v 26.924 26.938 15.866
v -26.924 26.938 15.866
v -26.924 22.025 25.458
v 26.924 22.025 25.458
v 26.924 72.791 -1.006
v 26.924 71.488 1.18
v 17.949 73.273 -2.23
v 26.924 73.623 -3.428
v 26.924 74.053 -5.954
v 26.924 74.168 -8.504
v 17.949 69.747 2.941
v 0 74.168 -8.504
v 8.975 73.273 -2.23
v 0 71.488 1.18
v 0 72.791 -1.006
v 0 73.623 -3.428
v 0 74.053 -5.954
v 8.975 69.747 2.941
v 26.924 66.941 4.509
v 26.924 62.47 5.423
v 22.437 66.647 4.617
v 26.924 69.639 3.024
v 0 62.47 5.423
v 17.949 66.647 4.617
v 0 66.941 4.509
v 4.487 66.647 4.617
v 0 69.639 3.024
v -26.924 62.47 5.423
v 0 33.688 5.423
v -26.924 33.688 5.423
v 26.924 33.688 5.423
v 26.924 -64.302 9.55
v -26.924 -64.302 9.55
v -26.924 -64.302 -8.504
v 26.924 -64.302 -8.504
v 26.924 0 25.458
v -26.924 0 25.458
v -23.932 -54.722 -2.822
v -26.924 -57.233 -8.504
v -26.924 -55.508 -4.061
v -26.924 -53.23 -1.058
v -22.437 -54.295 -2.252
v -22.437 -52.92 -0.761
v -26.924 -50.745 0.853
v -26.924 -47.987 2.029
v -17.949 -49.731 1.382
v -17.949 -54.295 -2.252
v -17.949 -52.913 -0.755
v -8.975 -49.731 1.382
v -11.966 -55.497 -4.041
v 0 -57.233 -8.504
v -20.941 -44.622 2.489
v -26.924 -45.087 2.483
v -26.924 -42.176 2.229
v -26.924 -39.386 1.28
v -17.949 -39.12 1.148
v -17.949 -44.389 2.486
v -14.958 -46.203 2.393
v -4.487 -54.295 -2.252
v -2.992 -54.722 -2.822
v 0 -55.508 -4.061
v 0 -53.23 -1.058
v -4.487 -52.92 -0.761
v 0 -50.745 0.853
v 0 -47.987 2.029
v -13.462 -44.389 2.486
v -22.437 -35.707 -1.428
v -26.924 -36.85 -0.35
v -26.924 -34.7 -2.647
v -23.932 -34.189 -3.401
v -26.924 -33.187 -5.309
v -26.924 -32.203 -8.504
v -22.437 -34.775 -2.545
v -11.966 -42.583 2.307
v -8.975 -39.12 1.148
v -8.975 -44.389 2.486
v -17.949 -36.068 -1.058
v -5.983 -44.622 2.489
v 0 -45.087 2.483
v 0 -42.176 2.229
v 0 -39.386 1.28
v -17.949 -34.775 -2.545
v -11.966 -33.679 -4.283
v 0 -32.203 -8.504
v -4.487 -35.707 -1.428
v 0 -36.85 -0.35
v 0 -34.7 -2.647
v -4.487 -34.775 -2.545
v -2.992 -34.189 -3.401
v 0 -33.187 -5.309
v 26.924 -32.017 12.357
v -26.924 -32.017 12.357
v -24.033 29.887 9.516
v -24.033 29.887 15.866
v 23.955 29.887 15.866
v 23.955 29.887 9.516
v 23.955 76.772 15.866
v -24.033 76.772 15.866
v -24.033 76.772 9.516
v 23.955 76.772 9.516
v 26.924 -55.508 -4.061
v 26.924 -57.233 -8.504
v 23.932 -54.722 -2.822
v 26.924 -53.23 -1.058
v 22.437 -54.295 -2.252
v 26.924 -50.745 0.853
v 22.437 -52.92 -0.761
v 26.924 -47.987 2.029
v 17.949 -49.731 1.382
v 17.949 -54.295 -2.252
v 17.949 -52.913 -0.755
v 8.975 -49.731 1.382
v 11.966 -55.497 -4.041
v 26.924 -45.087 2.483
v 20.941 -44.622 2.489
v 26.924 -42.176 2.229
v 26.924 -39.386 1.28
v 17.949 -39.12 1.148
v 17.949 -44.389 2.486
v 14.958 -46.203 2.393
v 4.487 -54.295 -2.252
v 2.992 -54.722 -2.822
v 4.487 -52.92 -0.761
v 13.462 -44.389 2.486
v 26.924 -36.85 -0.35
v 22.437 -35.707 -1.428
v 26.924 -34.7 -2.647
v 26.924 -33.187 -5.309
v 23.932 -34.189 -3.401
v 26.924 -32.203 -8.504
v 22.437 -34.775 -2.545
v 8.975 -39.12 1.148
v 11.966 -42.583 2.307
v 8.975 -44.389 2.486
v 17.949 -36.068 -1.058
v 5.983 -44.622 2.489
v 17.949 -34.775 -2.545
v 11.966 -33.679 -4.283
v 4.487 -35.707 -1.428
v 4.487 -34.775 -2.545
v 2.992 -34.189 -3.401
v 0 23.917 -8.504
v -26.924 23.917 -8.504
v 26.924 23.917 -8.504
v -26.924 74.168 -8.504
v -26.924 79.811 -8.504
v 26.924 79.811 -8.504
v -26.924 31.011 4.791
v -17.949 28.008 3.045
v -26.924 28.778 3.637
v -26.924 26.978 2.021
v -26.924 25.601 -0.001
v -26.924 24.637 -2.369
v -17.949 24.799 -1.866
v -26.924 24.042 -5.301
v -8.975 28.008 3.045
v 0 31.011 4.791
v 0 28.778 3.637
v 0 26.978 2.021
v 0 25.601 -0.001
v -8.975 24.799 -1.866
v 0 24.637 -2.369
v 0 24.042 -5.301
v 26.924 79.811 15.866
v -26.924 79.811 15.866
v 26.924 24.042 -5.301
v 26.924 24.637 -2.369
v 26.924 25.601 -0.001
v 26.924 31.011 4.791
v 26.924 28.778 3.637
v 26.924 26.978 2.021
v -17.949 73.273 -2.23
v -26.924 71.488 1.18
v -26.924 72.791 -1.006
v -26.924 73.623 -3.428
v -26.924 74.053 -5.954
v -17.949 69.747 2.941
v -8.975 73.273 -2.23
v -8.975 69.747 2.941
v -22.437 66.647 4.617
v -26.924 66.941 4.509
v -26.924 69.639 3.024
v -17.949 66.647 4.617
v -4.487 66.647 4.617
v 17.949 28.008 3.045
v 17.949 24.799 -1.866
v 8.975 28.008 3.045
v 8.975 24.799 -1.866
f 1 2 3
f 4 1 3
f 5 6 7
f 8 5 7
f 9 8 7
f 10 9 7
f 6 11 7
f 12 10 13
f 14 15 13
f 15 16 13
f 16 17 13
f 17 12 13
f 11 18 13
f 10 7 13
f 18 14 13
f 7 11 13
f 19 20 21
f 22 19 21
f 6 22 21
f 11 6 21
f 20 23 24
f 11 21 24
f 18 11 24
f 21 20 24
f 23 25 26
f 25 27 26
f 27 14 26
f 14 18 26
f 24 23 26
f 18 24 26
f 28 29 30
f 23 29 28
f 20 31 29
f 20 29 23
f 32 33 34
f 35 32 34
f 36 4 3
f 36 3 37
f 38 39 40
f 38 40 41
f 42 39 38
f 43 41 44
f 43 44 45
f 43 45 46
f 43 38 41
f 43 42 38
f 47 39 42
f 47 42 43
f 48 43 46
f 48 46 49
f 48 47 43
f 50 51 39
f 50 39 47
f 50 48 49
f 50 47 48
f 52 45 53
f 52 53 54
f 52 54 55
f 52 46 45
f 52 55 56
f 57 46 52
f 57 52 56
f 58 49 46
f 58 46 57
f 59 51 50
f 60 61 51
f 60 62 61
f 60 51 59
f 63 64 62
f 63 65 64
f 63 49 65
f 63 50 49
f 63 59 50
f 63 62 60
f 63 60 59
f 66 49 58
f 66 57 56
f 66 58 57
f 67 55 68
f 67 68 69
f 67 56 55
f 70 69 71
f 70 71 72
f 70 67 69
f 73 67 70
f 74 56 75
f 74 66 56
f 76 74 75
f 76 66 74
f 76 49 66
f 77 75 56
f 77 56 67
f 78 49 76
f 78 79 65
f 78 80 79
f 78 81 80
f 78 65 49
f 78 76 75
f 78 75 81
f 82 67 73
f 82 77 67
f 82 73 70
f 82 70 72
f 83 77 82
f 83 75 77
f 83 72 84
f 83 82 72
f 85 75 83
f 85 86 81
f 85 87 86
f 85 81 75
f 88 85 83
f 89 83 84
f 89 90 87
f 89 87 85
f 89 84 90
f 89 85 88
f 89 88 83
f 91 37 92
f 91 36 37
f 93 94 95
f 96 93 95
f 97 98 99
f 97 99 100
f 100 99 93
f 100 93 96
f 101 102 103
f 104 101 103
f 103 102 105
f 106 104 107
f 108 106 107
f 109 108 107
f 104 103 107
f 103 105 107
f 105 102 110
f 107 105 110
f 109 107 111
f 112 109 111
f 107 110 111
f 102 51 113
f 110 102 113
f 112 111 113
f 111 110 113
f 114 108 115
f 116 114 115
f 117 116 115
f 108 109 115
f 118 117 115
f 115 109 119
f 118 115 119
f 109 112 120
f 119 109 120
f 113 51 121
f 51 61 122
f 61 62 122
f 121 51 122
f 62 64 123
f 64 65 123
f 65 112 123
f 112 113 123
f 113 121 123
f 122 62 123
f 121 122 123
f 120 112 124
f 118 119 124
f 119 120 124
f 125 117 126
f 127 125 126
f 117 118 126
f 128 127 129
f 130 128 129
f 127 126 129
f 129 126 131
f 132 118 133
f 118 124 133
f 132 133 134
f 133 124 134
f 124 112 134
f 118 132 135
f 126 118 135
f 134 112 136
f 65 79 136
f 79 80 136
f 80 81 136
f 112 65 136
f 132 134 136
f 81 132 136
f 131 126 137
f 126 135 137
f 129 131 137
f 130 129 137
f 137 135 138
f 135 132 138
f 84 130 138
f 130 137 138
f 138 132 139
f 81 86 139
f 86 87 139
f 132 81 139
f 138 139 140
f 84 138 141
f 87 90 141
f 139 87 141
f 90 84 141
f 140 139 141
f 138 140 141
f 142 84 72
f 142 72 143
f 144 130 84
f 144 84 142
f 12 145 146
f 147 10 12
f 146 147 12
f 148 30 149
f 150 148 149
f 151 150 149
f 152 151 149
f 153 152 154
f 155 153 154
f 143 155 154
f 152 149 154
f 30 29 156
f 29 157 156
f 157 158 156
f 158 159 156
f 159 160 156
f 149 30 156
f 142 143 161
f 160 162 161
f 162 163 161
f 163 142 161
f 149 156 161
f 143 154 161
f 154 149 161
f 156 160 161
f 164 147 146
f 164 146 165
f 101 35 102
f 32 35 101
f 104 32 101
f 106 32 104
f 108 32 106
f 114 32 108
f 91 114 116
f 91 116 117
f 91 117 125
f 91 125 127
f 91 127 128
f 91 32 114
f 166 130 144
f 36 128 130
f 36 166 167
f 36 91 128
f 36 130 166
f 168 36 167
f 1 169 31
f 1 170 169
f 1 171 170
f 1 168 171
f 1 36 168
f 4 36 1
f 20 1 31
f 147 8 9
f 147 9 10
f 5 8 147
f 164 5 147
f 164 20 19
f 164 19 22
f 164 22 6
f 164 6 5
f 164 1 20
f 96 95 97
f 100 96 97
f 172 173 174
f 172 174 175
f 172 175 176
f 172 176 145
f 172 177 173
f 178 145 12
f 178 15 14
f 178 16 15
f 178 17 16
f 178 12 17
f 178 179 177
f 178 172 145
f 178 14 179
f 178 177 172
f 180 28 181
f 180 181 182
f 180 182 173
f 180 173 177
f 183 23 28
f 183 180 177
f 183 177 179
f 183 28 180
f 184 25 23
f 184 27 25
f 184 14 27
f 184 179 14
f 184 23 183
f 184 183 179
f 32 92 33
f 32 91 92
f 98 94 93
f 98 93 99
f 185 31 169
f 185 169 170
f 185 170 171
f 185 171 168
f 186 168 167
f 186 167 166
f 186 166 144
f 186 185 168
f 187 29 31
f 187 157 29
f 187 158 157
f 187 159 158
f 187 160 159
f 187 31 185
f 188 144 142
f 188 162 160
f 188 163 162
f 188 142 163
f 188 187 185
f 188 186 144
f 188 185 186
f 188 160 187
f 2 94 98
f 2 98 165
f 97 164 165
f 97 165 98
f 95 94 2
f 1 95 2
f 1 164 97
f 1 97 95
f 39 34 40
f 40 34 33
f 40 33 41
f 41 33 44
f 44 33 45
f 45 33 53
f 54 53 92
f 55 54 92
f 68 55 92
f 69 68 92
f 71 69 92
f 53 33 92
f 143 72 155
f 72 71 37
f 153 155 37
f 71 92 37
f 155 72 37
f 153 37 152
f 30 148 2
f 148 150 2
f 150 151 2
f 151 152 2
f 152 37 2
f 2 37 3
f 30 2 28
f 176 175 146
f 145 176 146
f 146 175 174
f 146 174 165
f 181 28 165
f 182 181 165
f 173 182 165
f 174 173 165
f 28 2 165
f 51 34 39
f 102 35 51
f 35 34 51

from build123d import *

# Parameters (mm, degrees)
F1_DEPTH = 26.924
F2_W     = 47.987626
F2_H     = 46.88446
F3_DEPTH = 6.35


with BuildPart() as f1:
    # F0 (on Right) → F1 (new body, symmetric)
    with BuildSketch(Plane.YZ):
        with BuildLine():
            Line((-64.30237, 9.54966), (-64.30237, -8.503878))
            Line((-64.30237, -8.503878), (-57.232525, -8.503878))
            add(Edge.make_bspline(
                [(-57.232525, -8.503878), (-53.551972, 6.674868), (-35.007033, 5.623281), (-32.202799, -8.503878)],
                knots=[0, 0, 0, 0, 25.029726, 25.029726, 25.029726, 25.029726], degree=3))
            Line((-32.202799, -8.503878), (23.917472, -8.503878))
            add(Edge.make_bspline(
                [(33.688288, 5.422598), (26.724873, 4.578994), (23.683522, -1.269759), (23.917472, -8.503878)],
                knots=[0, 0, 0, 0, 17.012219, 17.012219, 17.012219, 17.012219], degree=3))
            Line((33.688288, 5.422598), (62.469676, 5.422598))
            add(Edge.make_bspline(
                [(62.469676, 5.422598), (71.99423, 4.812944), (74.216753, -2.20556), (74.167915, -8.503878)],
                knots=[0, 0, 0, 0, 18.187785, 18.187785, 18.187785, 18.187785], degree=3))
            Line((74.167915, -8.503878), (79.810925, -8.503878))
            Line((79.810925, -8.503878), (79.810925, 15.866313))
            Line((79.810925, 15.866313), (26.938191, 15.866313))
            Line((26.938191, 15.866313), (22.025237, 25.458271))
            Line((22.025237, 25.458271), (0, 25.458271))
            Line((0, 25.458271), (-32.017246, 12.357062))
            Line((-32.017246, 12.357062), (-64.30237, 9.54966))
        make_face()
    extrude(amount=F1_DEPTH, both=True)

    # F2 (on face) → F3 (cut)
    with BuildSketch(Plane.XY.offset(15.866313)):
        with Locations((-0.038729, 53.329439)):
            Rectangle(F2_W, F2_H)
    extrude(amount=-F3_DEPTH, mode=Mode.SUBTRACT)


solid = f1.part
